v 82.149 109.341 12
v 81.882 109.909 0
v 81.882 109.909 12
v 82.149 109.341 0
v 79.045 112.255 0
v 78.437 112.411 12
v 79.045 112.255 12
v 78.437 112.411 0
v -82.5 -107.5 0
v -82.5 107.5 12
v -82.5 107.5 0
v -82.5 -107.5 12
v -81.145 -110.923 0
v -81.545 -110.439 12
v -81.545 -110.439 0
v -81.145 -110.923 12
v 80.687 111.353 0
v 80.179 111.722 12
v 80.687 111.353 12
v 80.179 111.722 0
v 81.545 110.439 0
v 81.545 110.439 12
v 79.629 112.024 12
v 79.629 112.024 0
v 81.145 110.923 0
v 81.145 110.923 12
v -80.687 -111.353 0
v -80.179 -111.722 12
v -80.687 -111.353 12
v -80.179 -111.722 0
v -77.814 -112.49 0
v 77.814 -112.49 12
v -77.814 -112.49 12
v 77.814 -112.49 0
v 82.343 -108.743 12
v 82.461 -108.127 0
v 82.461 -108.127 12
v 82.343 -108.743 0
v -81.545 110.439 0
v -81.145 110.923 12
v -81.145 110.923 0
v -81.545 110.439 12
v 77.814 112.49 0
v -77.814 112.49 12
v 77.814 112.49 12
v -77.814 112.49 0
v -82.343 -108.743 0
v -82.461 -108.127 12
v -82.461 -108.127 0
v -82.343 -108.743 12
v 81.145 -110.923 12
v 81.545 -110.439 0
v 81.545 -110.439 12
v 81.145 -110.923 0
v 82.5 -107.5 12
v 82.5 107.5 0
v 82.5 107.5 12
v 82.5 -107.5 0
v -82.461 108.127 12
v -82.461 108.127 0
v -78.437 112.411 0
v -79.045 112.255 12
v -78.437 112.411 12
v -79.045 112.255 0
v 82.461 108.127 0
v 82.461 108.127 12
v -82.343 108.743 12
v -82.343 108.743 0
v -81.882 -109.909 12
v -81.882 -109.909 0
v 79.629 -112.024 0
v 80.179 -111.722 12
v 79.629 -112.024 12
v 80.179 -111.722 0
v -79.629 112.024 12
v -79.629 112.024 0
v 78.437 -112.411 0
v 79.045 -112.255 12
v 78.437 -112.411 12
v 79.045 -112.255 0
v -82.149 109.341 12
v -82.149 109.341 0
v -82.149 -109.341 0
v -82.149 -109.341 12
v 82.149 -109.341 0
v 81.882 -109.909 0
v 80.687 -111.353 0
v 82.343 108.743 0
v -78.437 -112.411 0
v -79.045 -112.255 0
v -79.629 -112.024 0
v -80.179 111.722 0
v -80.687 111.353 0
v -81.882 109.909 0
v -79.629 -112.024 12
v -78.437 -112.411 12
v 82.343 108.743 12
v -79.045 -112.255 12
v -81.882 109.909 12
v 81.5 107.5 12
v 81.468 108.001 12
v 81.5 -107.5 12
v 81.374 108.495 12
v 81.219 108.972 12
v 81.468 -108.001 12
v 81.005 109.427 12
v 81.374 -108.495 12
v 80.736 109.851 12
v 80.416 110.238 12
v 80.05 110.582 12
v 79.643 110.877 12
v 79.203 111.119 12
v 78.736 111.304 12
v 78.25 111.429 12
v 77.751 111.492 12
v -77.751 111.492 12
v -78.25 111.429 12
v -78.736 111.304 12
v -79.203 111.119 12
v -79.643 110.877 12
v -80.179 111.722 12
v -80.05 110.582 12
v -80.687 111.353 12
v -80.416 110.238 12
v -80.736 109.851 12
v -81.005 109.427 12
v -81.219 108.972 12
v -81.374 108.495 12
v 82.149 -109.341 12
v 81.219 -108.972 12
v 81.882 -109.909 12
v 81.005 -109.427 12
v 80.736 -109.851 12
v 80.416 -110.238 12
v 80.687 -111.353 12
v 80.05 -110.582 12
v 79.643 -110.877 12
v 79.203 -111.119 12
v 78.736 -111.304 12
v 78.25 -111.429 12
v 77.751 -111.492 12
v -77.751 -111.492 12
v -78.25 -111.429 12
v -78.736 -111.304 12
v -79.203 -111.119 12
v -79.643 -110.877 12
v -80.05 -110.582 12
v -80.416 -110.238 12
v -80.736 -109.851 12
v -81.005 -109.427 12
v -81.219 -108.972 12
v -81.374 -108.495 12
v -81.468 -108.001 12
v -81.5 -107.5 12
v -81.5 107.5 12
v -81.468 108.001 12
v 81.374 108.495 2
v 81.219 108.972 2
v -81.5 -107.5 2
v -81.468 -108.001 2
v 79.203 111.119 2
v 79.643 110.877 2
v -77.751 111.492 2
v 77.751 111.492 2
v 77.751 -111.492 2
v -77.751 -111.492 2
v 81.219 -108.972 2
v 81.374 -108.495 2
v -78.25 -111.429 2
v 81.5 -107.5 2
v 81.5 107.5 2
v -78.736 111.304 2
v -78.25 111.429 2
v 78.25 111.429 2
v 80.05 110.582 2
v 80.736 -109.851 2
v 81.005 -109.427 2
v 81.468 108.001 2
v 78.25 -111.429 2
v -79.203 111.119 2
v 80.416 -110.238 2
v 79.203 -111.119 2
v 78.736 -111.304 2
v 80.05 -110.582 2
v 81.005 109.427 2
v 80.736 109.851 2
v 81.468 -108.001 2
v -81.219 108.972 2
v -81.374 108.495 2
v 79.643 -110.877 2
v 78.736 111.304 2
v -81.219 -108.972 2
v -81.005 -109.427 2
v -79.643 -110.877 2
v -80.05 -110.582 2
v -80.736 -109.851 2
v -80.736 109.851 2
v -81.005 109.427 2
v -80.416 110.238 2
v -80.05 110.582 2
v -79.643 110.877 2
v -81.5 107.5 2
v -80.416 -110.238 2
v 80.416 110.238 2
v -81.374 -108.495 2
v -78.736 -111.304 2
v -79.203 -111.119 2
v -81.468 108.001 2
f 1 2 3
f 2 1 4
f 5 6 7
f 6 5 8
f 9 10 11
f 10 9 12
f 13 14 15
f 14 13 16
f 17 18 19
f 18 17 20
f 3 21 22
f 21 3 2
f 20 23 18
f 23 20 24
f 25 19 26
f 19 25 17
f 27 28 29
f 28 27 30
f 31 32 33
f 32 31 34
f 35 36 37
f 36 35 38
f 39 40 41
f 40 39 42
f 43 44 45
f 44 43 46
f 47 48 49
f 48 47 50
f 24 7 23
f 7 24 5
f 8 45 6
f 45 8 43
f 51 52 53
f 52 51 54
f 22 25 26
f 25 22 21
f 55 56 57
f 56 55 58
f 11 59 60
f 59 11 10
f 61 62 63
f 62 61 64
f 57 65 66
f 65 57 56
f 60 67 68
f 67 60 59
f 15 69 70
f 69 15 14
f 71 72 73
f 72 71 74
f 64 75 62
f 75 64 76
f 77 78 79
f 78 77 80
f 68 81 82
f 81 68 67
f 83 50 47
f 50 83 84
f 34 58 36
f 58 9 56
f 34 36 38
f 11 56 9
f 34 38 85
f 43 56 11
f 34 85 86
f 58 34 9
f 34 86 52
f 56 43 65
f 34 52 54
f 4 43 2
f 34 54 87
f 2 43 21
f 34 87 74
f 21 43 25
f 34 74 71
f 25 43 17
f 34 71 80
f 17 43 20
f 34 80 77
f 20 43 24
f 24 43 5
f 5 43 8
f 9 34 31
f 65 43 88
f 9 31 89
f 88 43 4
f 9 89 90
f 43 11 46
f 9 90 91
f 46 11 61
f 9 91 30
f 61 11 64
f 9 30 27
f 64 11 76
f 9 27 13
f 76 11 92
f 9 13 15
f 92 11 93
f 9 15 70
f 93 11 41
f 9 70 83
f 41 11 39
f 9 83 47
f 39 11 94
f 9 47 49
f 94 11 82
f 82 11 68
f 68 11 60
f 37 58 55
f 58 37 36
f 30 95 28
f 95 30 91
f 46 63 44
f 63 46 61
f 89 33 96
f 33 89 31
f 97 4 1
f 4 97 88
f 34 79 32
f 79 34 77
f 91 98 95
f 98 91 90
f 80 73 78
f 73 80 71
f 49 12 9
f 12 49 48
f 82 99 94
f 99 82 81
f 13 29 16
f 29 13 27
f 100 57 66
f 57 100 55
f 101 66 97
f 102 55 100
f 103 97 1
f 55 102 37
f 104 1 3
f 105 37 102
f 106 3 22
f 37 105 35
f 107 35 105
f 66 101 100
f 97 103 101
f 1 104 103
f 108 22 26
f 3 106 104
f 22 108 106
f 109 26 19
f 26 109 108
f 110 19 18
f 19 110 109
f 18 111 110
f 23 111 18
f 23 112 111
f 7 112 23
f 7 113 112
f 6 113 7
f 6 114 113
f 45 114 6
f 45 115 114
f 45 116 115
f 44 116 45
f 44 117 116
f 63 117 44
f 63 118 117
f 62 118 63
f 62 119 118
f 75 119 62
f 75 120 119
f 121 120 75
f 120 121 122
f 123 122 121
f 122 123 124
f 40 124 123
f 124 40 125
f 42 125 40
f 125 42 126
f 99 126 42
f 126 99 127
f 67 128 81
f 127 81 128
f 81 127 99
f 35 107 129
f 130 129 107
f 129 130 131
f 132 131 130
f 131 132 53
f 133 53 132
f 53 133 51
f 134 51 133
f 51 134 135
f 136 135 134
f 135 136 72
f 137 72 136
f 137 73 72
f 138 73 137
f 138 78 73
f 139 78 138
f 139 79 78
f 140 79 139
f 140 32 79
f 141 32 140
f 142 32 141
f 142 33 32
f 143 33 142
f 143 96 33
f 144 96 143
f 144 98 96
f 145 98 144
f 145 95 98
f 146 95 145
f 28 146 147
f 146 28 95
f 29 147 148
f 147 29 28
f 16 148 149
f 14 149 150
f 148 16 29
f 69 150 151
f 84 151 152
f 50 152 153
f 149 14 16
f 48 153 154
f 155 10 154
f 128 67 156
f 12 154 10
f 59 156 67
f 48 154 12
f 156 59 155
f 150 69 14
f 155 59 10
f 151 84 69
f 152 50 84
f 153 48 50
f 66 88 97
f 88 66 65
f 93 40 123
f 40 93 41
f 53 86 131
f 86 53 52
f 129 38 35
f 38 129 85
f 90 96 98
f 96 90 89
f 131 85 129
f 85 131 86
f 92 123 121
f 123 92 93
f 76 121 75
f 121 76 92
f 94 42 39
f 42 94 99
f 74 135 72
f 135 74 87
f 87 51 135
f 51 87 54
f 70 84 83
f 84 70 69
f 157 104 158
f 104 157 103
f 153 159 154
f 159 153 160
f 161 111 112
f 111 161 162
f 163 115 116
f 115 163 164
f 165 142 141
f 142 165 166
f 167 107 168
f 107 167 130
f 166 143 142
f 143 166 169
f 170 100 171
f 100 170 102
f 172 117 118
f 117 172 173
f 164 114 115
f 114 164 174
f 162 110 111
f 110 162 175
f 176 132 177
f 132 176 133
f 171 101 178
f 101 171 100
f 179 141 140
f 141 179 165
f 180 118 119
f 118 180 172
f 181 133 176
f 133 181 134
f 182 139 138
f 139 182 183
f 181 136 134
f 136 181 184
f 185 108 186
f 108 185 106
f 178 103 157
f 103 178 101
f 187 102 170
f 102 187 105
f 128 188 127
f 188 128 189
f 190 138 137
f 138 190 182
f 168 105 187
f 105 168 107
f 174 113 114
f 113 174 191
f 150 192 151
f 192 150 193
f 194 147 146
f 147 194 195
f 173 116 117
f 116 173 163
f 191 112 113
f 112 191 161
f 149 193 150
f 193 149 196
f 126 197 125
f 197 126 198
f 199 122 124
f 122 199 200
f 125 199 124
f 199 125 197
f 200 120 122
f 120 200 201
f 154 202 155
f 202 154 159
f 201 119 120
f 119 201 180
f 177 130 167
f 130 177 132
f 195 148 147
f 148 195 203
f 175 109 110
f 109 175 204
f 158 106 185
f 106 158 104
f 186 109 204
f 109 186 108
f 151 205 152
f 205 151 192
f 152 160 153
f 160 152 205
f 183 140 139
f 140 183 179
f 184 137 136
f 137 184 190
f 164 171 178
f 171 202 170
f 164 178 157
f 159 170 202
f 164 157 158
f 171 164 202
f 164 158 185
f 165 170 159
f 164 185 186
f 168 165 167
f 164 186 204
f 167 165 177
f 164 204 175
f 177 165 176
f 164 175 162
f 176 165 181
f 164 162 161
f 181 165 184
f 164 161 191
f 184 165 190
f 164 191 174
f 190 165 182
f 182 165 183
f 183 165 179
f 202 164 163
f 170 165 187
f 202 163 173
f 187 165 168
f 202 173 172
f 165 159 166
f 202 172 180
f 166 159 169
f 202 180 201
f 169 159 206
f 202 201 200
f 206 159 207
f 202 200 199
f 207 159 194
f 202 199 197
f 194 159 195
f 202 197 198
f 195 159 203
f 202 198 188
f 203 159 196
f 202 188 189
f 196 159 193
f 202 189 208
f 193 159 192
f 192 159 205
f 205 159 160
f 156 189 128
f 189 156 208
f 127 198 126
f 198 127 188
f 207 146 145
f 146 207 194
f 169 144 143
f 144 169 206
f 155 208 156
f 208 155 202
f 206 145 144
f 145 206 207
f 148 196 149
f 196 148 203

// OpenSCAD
$fn = 50;


difference() {
	union() {
		hull() {
			translate(v = [-77.5000000000, 107.5000000000, 0]) {
				cylinder(h = 12, r = 5);
			}
			translate(v = [77.5000000000, 107.5000000000, 0]) {
				cylinder(h = 12, r = 5);
			}
			translate(v = [-77.5000000000, -107.5000000000, 0]) {
				cylinder(h = 12, r = 5);
			}
			translate(v = [77.5000000000, -107.5000000000, 0]) {
				cylinder(h = 12, r = 5);
			}
		}
	}
	union() {
		translate(v = [0, 0, 2]) {
			hull() {
				translate(v = [-77.5000000000, 107.5000000000, 0]) {
					cylinder(h = 10, r = 4);
				}
				translate(v = [77.5000000000, 107.5000000000, 0]) {
					cylinder(h = 10, r = 4);
				}
				translate(v = [-77.5000000000, -107.5000000000, 0]) {
					cylinder(h = 10, r = 4);
				}
				translate(v = [77.5000000000, -107.5000000000, 0]) {
					cylinder(h = 10, r = 4);
				}
			}
		}
	}
}
